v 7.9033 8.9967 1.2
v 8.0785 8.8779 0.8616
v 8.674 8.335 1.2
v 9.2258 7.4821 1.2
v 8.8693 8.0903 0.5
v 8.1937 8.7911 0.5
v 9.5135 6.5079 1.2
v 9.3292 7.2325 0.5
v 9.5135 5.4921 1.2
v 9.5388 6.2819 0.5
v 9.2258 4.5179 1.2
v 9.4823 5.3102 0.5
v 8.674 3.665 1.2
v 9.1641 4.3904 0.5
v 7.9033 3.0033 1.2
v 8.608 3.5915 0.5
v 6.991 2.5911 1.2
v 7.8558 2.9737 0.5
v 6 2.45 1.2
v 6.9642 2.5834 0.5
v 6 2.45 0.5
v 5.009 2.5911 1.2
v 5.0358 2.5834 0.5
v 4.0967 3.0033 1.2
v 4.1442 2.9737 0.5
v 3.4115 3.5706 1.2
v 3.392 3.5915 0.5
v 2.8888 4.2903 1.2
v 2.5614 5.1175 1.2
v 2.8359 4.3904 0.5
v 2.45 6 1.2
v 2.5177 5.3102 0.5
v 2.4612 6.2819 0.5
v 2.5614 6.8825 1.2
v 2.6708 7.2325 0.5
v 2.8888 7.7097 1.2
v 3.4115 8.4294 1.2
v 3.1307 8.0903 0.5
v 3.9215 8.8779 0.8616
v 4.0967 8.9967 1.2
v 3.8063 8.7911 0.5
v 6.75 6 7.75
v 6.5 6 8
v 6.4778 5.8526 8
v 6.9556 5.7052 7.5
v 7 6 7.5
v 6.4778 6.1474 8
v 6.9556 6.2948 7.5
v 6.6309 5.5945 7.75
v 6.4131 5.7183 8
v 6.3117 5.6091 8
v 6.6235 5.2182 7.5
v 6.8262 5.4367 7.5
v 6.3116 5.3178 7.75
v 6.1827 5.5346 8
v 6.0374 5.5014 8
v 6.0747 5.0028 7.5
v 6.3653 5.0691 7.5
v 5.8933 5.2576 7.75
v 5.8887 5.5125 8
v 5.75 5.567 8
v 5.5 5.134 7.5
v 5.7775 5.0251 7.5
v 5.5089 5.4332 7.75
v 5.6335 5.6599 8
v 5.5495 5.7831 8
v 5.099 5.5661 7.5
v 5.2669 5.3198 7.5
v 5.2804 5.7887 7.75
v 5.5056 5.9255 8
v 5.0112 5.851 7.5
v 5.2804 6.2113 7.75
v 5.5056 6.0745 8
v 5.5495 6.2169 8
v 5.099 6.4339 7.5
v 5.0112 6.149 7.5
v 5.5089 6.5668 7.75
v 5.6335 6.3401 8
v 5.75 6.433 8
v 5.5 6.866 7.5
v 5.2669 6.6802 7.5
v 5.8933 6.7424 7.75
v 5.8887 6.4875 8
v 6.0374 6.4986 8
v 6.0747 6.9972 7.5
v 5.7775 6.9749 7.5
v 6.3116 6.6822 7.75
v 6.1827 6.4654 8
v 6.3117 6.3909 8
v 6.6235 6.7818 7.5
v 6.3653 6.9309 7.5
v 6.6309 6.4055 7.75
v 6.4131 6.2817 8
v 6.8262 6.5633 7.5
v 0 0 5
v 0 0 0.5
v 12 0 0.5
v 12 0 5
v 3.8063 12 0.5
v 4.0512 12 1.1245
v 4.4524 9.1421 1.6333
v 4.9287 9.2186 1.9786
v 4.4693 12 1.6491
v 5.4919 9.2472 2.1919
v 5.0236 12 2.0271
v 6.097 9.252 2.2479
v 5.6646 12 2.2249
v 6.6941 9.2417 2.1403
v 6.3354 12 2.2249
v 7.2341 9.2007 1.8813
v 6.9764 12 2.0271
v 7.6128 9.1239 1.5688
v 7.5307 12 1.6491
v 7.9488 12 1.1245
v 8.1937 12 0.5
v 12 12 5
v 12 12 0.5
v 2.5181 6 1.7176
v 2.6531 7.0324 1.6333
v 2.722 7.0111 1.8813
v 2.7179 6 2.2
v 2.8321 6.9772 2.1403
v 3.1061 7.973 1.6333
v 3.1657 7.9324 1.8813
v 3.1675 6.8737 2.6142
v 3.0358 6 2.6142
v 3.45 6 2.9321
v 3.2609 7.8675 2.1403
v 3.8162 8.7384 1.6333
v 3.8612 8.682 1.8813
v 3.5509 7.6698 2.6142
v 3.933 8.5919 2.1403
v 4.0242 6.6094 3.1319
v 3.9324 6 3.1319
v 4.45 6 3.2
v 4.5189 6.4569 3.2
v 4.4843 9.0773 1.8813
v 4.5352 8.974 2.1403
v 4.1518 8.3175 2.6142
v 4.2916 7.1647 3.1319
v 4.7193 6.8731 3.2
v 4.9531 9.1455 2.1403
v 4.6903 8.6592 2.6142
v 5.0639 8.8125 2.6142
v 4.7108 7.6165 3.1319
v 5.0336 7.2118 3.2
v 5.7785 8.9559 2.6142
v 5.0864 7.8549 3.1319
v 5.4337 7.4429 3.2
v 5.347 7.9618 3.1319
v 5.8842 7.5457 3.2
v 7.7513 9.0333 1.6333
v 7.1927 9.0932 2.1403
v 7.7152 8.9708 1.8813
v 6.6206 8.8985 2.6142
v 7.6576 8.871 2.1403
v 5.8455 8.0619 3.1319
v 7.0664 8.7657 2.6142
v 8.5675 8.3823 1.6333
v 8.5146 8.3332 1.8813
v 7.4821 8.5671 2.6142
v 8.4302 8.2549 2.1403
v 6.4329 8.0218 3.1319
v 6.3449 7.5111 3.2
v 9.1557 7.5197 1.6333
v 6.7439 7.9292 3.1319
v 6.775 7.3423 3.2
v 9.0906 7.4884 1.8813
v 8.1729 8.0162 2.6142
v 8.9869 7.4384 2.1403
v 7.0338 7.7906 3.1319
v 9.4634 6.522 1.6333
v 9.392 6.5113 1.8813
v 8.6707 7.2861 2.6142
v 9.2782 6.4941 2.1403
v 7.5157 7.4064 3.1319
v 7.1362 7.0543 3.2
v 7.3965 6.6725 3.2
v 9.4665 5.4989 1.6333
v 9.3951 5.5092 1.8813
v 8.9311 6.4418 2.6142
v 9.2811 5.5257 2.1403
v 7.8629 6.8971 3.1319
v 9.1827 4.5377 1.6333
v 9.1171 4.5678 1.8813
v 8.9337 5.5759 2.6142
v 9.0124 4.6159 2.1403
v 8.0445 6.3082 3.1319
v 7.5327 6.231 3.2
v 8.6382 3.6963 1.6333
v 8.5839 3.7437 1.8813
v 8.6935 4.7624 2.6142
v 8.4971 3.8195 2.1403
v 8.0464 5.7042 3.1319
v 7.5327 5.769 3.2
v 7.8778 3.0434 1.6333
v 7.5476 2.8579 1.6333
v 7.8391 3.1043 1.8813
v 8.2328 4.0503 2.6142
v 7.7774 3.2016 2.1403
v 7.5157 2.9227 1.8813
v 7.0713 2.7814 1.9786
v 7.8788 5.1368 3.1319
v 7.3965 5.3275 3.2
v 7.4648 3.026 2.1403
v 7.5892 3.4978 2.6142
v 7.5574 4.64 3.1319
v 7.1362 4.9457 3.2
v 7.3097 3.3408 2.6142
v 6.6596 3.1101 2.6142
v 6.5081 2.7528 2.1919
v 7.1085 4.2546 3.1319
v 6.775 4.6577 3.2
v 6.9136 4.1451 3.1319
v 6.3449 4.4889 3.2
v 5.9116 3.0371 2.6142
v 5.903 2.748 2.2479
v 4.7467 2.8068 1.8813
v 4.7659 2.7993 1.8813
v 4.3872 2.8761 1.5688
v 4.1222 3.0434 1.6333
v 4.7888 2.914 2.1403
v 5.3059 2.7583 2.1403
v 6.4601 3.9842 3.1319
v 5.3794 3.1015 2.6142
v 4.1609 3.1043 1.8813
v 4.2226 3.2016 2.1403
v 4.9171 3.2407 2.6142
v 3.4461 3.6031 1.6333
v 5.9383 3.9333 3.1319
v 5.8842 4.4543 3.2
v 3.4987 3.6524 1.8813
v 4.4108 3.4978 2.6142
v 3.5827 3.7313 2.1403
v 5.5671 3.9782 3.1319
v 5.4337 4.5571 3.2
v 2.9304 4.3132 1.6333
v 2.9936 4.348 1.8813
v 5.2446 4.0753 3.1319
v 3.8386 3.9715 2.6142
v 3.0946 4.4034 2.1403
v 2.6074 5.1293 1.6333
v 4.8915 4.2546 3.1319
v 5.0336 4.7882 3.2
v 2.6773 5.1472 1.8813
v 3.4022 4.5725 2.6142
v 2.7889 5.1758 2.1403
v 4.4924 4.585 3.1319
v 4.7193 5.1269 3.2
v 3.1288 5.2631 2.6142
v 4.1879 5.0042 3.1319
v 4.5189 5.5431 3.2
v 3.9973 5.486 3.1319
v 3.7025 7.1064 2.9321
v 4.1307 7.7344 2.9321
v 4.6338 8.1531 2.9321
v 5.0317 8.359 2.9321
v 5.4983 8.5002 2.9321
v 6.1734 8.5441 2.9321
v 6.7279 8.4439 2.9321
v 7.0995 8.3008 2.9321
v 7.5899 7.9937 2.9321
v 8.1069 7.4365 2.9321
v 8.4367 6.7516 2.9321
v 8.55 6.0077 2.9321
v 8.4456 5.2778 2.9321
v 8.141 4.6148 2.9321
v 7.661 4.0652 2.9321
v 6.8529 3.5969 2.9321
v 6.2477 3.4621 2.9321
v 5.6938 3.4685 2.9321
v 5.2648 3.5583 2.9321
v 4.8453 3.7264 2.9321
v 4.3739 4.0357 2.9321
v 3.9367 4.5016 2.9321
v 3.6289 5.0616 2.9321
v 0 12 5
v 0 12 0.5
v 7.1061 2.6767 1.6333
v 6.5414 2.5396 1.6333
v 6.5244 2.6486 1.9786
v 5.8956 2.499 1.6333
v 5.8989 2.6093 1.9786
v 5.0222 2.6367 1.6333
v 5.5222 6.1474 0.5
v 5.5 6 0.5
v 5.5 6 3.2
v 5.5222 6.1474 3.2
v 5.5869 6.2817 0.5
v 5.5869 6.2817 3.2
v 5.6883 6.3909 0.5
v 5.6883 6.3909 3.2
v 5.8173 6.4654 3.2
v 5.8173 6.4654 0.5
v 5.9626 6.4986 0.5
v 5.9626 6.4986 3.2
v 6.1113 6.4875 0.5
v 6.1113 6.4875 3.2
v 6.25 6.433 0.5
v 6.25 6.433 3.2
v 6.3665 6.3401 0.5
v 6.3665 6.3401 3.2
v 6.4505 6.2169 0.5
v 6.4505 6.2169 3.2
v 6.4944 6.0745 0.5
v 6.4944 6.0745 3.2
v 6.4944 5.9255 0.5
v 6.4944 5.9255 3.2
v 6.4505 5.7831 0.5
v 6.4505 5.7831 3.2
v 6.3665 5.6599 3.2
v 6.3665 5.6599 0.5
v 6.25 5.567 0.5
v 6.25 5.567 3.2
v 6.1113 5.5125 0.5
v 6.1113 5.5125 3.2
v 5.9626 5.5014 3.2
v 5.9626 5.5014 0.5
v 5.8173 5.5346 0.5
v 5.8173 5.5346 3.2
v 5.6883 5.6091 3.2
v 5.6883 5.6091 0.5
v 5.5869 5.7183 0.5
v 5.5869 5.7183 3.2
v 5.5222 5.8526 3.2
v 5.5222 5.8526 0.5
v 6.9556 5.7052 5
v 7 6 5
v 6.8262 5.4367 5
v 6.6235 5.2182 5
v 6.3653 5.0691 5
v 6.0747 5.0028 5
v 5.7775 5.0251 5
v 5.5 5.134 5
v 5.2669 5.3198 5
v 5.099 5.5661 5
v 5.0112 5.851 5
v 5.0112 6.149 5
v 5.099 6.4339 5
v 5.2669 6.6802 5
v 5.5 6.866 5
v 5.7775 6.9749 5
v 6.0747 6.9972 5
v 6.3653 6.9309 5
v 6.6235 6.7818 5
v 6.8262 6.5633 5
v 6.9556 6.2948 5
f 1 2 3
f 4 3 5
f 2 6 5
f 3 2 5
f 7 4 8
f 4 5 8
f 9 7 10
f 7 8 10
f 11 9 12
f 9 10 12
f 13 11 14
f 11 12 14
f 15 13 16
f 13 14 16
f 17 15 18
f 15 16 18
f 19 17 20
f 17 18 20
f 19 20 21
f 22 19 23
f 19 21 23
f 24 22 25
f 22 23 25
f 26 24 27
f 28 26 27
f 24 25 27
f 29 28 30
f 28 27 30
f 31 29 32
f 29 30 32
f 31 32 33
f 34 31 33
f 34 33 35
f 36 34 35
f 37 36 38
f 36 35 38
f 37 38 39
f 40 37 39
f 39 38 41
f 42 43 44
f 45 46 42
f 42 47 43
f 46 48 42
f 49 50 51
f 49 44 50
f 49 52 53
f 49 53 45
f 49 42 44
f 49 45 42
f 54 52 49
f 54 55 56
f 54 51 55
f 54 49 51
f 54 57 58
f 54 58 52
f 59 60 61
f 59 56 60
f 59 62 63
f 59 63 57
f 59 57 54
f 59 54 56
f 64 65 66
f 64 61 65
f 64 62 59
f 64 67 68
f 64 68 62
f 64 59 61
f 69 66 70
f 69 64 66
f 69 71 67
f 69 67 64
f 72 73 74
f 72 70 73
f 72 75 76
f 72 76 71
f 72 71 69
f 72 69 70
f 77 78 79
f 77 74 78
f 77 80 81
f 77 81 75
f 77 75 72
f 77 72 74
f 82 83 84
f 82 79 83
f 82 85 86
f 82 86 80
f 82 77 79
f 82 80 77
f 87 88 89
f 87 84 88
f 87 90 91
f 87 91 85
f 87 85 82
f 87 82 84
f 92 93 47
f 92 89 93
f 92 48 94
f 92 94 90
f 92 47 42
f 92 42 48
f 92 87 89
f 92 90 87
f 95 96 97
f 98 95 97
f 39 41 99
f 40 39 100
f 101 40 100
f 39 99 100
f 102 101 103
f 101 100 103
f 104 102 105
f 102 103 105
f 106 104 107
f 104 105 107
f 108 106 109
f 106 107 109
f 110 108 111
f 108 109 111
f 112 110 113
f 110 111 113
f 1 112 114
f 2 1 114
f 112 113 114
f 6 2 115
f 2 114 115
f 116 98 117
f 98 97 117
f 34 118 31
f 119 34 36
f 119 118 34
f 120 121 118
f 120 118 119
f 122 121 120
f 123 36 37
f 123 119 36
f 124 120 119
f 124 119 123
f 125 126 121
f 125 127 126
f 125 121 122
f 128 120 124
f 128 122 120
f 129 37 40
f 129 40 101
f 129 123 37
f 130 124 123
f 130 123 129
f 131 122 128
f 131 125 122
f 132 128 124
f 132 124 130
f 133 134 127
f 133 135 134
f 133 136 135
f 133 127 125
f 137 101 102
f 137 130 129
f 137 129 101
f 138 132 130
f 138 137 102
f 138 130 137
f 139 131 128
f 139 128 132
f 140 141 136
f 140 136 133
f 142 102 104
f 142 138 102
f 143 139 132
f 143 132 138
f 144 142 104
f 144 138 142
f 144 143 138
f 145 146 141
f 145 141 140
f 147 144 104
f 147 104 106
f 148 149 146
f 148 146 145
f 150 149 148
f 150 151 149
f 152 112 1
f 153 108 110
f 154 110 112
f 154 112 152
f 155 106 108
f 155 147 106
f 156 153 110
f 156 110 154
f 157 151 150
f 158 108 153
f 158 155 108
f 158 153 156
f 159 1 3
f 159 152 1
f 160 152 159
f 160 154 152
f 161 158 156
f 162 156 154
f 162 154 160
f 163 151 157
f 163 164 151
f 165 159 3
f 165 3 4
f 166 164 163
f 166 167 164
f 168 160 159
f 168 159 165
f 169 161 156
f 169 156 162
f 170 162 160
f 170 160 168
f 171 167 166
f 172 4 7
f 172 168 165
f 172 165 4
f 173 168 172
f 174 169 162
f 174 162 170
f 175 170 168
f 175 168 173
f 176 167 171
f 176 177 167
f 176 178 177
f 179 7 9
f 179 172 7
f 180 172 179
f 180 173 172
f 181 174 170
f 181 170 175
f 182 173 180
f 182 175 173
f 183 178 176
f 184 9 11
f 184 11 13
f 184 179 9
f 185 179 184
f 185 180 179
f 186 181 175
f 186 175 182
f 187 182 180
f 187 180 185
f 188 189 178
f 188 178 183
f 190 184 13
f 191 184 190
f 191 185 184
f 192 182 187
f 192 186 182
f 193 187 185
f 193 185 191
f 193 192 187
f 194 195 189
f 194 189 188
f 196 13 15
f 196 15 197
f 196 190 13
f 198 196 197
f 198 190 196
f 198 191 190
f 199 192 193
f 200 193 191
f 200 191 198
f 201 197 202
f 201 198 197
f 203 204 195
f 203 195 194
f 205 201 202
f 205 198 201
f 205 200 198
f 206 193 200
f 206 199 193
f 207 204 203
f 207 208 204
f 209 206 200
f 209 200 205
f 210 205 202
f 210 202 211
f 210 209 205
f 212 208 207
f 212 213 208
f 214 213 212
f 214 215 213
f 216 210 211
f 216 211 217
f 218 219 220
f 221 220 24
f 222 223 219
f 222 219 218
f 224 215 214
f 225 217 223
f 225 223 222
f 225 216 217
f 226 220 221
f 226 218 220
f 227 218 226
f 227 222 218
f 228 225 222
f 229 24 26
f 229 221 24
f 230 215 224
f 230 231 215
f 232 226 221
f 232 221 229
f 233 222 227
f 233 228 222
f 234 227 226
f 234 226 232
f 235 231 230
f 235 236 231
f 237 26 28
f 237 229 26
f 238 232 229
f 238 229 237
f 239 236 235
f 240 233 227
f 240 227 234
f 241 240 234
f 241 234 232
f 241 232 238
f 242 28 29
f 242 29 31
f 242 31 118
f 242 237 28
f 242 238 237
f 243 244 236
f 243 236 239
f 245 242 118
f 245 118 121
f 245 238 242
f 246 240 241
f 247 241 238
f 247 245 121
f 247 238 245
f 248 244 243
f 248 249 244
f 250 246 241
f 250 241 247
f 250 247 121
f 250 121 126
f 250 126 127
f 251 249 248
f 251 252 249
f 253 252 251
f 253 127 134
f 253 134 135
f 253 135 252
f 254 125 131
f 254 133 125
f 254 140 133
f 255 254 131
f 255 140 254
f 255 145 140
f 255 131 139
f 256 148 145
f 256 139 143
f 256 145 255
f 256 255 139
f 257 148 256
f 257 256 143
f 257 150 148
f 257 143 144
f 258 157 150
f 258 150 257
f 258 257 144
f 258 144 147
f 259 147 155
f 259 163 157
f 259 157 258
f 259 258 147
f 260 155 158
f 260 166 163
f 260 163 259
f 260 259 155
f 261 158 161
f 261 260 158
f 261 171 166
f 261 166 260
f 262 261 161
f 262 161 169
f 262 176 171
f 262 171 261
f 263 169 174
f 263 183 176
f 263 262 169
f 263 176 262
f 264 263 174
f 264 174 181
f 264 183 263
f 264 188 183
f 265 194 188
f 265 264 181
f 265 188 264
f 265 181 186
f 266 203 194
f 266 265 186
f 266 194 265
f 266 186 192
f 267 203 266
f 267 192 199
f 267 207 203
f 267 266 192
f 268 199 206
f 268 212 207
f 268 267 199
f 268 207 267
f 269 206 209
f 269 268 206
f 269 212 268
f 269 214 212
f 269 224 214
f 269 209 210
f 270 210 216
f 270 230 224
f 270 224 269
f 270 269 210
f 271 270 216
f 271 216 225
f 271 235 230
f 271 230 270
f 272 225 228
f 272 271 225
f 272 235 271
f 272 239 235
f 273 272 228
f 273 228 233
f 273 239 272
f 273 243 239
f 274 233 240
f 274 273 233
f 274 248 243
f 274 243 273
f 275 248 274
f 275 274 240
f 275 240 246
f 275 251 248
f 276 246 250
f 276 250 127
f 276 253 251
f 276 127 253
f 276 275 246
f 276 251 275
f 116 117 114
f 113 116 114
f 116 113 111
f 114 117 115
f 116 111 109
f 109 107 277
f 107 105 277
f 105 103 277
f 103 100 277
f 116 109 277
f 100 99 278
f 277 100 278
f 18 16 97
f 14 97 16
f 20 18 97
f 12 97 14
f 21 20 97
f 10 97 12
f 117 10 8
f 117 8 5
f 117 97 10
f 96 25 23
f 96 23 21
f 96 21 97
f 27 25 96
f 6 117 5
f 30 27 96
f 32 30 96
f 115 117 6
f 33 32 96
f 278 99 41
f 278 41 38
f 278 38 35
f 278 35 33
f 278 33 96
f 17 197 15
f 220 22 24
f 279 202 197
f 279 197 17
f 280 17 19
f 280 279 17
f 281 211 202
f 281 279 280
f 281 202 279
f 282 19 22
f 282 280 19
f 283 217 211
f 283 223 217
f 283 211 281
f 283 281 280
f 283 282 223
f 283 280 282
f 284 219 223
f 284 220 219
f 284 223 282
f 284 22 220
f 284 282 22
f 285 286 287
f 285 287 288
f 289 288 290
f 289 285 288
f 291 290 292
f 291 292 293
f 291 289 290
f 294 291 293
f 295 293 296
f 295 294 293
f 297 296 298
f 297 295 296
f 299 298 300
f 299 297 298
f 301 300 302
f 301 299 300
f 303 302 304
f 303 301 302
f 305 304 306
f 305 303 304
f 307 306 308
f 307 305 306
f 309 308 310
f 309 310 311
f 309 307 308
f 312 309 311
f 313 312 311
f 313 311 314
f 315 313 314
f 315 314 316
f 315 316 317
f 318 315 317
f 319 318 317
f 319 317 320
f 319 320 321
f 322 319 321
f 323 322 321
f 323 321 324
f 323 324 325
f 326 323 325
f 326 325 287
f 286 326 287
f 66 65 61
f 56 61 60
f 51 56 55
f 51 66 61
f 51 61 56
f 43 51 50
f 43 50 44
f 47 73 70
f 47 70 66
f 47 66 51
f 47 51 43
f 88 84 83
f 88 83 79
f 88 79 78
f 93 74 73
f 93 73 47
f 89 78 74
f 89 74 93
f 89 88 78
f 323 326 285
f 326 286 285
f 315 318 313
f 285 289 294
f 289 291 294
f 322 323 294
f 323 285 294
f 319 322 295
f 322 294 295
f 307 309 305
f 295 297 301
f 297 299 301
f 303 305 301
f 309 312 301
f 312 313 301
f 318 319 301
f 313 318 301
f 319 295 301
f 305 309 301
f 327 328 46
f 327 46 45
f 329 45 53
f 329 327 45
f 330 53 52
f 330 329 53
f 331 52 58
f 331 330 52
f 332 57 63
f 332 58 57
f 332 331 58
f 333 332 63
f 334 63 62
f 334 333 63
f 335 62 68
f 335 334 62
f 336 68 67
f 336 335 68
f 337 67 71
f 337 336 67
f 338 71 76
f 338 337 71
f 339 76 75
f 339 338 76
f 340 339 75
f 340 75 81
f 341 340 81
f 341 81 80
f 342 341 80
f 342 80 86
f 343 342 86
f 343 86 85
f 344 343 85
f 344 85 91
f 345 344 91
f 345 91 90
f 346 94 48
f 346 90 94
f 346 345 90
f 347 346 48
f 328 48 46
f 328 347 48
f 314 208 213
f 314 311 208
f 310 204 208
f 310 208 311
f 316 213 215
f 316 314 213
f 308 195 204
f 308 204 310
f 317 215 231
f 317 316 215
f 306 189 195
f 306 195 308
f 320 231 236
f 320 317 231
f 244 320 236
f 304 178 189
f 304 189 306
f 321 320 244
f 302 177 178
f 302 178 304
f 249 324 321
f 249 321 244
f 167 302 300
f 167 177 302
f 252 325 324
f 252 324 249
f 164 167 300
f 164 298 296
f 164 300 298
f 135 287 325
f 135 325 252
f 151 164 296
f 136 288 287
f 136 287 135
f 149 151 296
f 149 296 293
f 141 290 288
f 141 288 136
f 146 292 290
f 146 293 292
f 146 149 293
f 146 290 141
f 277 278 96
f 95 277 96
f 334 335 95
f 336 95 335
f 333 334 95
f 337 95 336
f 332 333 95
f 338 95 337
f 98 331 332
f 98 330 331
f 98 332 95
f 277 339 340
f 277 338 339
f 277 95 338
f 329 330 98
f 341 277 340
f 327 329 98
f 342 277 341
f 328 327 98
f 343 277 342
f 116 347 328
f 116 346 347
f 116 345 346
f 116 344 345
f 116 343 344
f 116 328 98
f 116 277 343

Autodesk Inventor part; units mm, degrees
ref_plane "YZ Plane" through (0, 0, 0) normal (1, 0, 0) x (0, 1, 0)
ref_plane "XZ Plane" through (0, 0, 0) normal (0, 1, 0) x (-1, 0, 0)
ref_plane "XY Plane" through (0, 0, 0) normal (0, 0, 1) x (1, 0, 0)
sketch "Skizze1" plane through (0, 0, 0) normal (0, 0, 1) x (1, 0, 0)
  line L0 (0, 0) -> (12, 0)
  line L1 (12, 0) -> (12, 12)
  line L2 (12, 12) -> (0, 12)
  line L3 (0, 12) -> (0, 0)
  dimension "d0" = 12
  dimension "d1" = 12
extrude "Extrusion1" add sketch "Skizze1" along normal blind 5
sketch "Skizze2" plane through (0, 0, 5) normal (0, 0, 1) x (1, 0, 0)
  circle A0 centre (6, 6) radius 1
  line L0 (12, 0) -> (12, 12) projected
  line L1 (0, 0) -> (12, 0) projected
  dimension "d4" = 6
  dimension "d5" = 6
  dimension "d6" = 2
extrude "Extrusion2" add sketch "Skizze2" along normal blind 3
chamfer "Fase1" distance 0.5 angle 45 1 edges at (5, 6, 8)
sketch "Skizze3" plane through (0, 12, 0) normal (0, 1, 0) x (1, 0, 0)
  line L0 (0, 0) -> (12, 0) projected
  circle A0 centre (6, 0) radius 2.25
  dimension "d12" = 4.5
extrude "Extrusion3" cut sketch "Skizze3" against normal blind 4
sketch "Skizze4" plane through (0, 0, 0) normal (0, 0, -1) x (-1, 0, 0)
  circle A0 centre (-6, 6) radius 0.5 projected
  circle A1 centre (-6, 6) radius 5.4
  point P0 (0, 0)
ref_plane "Arbeitsebene1" through (0, 0, 0.5) normal (0, 0, -1) x (-1, 0, 0)
sketch "Skizze5" plane through (0, 0, 0.5) normal (0, 0, -1) x (-1, 0, 0)
  circle A0 centre (-6, 6) radius 0.5 projected
  circle A1 centre (-6, 6) radius 3.55
  point P0 (0, 0)
  dimension "d18" = 7.1
extrude "Extrusion5" cut sketch "Skizze5" against normal blind 2.7
sketch "Skizze6" plane through (0, 12, 5) normal (0, 1, 0) x (1, 0, 0)
  line L0 (12, 4.5) -> (0, 4.5)
  line L1 (0, 4.5) -> (0, 5)
  line L2 (0, 5) -> (12, 5)
  line L3 (12, 5) -> (12, 4.5)
  line L4 (0, 5) -> (0, 0) projected
  line L5 (3.75, 5) -> (0, 5) projected
  line L6 (12, 5) -> (12, 0) projected
  line L7 (3.8063, 4.5) -> (8.1937, 4.5) projected
  dimension "d24" = 0
  dimension "d25" = 0
  dimension "d26" = 0
  dimension "d27" = 0
extrude "Extrusion6" cut sketch "Skizze6" against normal blind 20
fillet "Rundung1" radius 2 1 edges at (9.55, 6, 3.2)
properties part number "Elektrodenhaltr3.0"
